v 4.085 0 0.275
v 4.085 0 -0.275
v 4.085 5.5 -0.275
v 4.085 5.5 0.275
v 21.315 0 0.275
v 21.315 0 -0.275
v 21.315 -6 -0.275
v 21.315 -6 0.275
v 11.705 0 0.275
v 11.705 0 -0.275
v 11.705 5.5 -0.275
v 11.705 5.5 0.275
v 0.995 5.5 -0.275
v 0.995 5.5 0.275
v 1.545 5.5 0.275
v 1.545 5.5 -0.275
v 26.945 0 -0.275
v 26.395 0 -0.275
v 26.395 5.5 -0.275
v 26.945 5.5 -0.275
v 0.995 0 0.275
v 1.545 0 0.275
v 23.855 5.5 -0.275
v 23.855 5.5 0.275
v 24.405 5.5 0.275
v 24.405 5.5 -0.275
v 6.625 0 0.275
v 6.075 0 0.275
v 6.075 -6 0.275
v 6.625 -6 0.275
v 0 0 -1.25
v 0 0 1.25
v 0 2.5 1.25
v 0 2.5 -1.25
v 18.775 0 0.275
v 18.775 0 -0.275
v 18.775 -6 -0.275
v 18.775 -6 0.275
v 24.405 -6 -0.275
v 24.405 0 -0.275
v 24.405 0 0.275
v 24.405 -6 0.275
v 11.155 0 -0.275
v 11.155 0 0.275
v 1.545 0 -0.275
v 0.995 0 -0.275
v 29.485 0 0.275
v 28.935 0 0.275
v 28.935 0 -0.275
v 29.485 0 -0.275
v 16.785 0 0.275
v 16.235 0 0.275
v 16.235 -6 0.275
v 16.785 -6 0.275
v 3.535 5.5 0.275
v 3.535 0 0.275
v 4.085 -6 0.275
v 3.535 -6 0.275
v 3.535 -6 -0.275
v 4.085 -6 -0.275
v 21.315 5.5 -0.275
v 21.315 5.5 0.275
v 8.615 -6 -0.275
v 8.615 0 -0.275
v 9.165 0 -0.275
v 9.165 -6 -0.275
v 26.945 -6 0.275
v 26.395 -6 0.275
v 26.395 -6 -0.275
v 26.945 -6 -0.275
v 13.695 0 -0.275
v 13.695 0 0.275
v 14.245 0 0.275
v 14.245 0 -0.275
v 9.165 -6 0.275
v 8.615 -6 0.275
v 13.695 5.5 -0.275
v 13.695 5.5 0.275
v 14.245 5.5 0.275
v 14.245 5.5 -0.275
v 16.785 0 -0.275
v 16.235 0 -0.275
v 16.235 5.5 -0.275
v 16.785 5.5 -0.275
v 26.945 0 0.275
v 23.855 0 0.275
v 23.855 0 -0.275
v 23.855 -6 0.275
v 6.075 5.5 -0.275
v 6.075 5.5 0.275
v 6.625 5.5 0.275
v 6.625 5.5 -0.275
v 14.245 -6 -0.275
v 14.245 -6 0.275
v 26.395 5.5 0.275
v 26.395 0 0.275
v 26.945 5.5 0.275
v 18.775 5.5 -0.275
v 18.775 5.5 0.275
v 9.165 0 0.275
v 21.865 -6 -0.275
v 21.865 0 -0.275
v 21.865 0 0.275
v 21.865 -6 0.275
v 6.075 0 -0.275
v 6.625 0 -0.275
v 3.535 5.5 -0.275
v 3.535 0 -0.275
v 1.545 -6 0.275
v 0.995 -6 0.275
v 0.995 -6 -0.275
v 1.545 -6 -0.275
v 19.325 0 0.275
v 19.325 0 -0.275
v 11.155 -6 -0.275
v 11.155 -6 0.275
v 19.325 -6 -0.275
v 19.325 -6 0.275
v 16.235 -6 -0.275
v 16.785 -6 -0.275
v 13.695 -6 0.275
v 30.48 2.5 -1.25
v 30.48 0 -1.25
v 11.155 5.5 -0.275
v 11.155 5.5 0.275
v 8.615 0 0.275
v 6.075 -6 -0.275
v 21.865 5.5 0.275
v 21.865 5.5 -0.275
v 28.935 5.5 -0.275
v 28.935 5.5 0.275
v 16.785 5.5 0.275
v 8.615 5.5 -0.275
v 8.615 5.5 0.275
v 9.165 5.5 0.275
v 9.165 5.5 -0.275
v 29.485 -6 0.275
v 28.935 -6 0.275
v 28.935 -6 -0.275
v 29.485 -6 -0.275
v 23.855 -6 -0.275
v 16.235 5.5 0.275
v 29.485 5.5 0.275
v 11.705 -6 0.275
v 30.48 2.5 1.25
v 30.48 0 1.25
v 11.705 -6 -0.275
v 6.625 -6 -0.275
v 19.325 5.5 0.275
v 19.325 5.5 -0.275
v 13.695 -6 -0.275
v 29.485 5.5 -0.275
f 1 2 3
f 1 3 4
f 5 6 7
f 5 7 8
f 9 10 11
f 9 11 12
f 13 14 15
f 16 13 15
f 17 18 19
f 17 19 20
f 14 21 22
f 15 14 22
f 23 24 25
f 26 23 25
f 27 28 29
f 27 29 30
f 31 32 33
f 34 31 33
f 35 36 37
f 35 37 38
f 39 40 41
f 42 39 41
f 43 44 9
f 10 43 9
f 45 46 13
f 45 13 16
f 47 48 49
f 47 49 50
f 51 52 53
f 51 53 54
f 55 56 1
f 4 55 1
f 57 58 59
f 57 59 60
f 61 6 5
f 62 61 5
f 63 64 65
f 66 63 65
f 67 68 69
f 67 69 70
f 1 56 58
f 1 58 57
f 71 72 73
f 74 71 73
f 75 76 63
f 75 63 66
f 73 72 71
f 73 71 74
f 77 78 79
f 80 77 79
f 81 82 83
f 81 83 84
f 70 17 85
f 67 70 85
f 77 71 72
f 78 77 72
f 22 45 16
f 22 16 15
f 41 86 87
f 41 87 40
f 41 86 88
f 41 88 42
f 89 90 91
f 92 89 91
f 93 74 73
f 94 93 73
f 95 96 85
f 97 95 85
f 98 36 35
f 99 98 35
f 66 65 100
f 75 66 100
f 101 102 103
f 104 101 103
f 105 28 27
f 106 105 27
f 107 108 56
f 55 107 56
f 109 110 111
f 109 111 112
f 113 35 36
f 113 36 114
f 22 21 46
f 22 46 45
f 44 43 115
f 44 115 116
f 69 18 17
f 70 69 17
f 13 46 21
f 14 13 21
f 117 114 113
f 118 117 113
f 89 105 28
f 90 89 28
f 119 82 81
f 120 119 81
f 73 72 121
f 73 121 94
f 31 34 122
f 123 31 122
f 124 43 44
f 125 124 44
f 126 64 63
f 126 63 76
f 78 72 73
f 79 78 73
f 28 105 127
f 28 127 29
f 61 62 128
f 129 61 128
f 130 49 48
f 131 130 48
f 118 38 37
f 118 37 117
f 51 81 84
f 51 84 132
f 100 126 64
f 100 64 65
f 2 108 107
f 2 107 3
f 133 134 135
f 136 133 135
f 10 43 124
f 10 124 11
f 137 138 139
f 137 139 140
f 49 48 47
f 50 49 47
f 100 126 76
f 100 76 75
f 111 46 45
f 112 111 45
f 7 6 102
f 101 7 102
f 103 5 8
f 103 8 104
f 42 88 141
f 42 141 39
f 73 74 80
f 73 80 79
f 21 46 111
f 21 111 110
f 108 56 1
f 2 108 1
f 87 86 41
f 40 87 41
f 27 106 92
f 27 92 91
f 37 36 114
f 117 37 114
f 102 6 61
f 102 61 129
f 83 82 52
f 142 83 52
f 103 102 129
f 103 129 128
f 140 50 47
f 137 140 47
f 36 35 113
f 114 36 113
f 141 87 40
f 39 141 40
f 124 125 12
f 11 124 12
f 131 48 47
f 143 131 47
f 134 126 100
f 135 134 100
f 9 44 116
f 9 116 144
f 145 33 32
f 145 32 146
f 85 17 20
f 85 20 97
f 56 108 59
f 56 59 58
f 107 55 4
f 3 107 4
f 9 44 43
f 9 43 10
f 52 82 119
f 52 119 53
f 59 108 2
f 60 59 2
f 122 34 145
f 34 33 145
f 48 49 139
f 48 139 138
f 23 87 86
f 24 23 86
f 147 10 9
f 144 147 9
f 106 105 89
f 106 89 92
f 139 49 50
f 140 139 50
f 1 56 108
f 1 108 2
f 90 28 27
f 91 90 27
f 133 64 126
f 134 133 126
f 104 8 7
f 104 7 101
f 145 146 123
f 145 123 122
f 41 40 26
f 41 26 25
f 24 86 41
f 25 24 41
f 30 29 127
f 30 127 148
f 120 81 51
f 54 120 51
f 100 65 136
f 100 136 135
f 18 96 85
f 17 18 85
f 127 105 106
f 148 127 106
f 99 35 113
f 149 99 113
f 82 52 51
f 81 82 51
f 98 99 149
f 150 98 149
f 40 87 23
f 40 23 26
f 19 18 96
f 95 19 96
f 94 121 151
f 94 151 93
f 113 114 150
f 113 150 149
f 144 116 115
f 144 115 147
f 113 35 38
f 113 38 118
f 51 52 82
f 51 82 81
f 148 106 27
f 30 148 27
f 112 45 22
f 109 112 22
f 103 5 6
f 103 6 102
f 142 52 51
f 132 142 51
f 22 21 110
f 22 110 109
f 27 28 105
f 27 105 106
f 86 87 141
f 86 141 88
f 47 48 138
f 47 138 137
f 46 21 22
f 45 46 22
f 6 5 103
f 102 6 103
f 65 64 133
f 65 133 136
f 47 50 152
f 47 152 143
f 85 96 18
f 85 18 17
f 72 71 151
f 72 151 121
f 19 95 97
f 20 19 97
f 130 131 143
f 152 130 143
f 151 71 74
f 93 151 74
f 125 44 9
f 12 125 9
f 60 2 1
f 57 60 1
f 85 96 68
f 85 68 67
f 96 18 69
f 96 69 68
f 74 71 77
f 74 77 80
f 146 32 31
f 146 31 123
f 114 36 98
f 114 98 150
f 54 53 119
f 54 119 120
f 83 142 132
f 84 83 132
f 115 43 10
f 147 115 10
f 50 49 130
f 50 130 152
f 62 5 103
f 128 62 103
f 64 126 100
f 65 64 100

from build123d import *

# Parameters (mm, degrees)
SKETCH1_W              = 30.48
SKETCH1_H              = 2.5
BOSS_EXTRUDE1_DEPTH    = 1.25
SKETCH2_W              = 0.55
SKETCH2_H              = 0.55
BOSS_EXTRUDE2_DEPTH    = 6
BOSS_EXTRUDE2_2_DEPTH  = 6
BOSS_EXTRUDE2_3_DEPTH  = 6
BOSS_EXTRUDE2_4_DEPTH  = 6
BOSS_EXTRUDE2_5_DEPTH  = 6
BOSS_EXTRUDE2_6_DEPTH  = 6
BOSS_EXTRUDE2_7_DEPTH  = 6
BOSS_EXTRUDE2_8_DEPTH  = 6
BOSS_EXTRUDE2_9_DEPTH  = 6
BOSS_EXTRUDE2_10_DEPTH = 6
BOSS_EXTRUDE2_11_DEPTH = 6
BOSS_EXTRUDE2_12_DEPTH = 6
SKETCH2_2_W            = 0.55
SKETCH2_2_H            = 0.55
BOSS_EXTRUDE3_DEPTH    = 5.5
BOSS_EXTRUDE3_2_DEPTH  = 5.5
BOSS_EXTRUDE3_3_DEPTH  = 5.5
BOSS_EXTRUDE3_4_DEPTH  = 5.5
BOSS_EXTRUDE3_5_DEPTH  = 5.5
BOSS_EXTRUDE3_6_DEPTH  = 5.5
BOSS_EXTRUDE3_7_DEPTH  = 5.5
BOSS_EXTRUDE3_8_DEPTH  = 5.5
BOSS_EXTRUDE3_9_DEPTH  = 5.5
BOSS_EXTRUDE3_10_DEPTH = 5.5
BOSS_EXTRUDE3_11_DEPTH = 5.5
BOSS_EXTRUDE3_12_DEPTH = 5.5


with BuildPart() as part:
    # Sketch1 → Boss-Extrude1 (new body, symmetric)
    with BuildSketch(Plane.XY):
        with Locations((15.24, 1.25)):
            Rectangle(SKETCH1_W, SKETCH1_H)
    extrude(amount=BOSS_EXTRUDE1_DEPTH, both=True)


with BuildPart() as body_2:
    # Sketch2 → Boss-Extrude2 (new body)
    with BuildSketch(Plane.XZ):
        with Locations((3.81, 0)):
            Rectangle(SKETCH2_W, SKETCH2_H)
    extrude(amount=BOSS_EXTRUDE2_DEPTH)


with BuildPart() as body_3:
    # Sketch2 → Boss-Extrude2 2 (new body)
    with BuildSketch(Plane.XZ):
        with Locations((1.27, 0)):
            Rectangle(SKETCH2_W, SKETCH2_H)
    extrude(amount=BOSS_EXTRUDE2_2_DEPTH)


with BuildPart() as body_4:
    # Sketch2 → Boss-Extrude2 3 (new body)
    with BuildSketch(Plane.XZ):
        with Locations((6.35, 0)):
            Rectangle(SKETCH2_W, SKETCH2_H)
    extrude(amount=BOSS_EXTRUDE2_3_DEPTH)


with BuildPart() as body_5:
    # Sketch2 → Boss-Extrude2 4 (new body)
    with BuildSketch(Plane.XZ):
        with Locations((8.89, 0)):
            Rectangle(SKETCH2_W, SKETCH2_H)
    extrude(amount=BOSS_EXTRUDE2_4_DEPTH)


with BuildPart() as body_6:
    # Sketch2 → Boss-Extrude2 5 (new body)
    with BuildSketch(Plane.XZ):
        with Locations((11.43, 0)):
            Rectangle(SKETCH2_W, SKETCH2_H)
    extrude(amount=BOSS_EXTRUDE2_5_DEPTH)


with BuildPart() as body_7:
    # Sketch2 → Boss-Extrude2 6 (new body)
    with BuildSketch(Plane.XZ):
        with Locations((13.97, 0)):
            Rectangle(SKETCH2_W, SKETCH2_H)
    extrude(amount=BOSS_EXTRUDE2_6_DEPTH)


with BuildPart() as body_8:
    # Sketch2 → Boss-Extrude2 7 (new body)
    with BuildSketch(Plane.XZ):
        with Locations((16.51, 0)):
            Rectangle(SKETCH2_W, SKETCH2_H)
    extrude(amount=BOSS_EXTRUDE2_7_DEPTH)


with BuildPart() as body_9:
    # Sketch2 → Boss-Extrude2 8 (new body)
    with BuildSketch(Plane.XZ):
        with Locations((19.05, 0)):
            Rectangle(SKETCH2_W, SKETCH2_H)
    extrude(amount=BOSS_EXTRUDE2_8_DEPTH)


with BuildPart() as body_10:
    # Sketch2 → Boss-Extrude2 9 (new body)
    with BuildSketch(Plane.XZ):
        with Locations((21.59, 0)):
            Rectangle(SKETCH2_W, SKETCH2_H)
    extrude(amount=BOSS_EXTRUDE2_9_DEPTH)


with BuildPart() as body_11:
    # Sketch2 → Boss-Extrude2 10 (new body)
    with BuildSketch(Plane.XZ):
        with Locations((24.13, 0)):
            Rectangle(SKETCH2_W, SKETCH2_H)
    extrude(amount=BOSS_EXTRUDE2_10_DEPTH)


with BuildPart() as body_12:
    # Sketch2 → Boss-Extrude2 11 (new body)
    with BuildSketch(Plane.XZ):
        with Locations((26.67, 0)):
            Rectangle(SKETCH2_W, SKETCH2_H)
    extrude(amount=BOSS_EXTRUDE2_11_DEPTH)


with BuildPart() as body_13:
    # Sketch2 → Boss-Extrude2 12 (new body)
    with BuildSketch(Plane.XZ):
        with Locations((29.21, 0)):
            Rectangle(SKETCH2_W, SKETCH2_H)
    extrude(amount=BOSS_EXTRUDE2_12_DEPTH)


with BuildPart() as body_14:
    # Sketch2_2 → Boss-Extrude3 (new body)
    with BuildSketch(Plane.XZ):
        with Locations((3.81, 0)):
            Rectangle(SKETCH2_2_W, SKETCH2_2_H)
    extrude(amount=-BOSS_EXTRUDE3_DEPTH)


with BuildPart() as body_15:
    # Sketch2_2 → Boss-Extrude3 2 (new body)
    with BuildSketch(Plane.XZ):
        with Locations((1.27, 0)):
            Rectangle(SKETCH2_2_W, SKETCH2_2_H)
    extrude(amount=-BOSS_EXTRUDE3_2_DEPTH)


with BuildPart() as body_16:
    # Sketch2_2 → Boss-Extrude3 3 (new body)
    with BuildSketch(Plane.XZ):
        with Locations((6.35, 0)):
            Rectangle(SKETCH2_2_W, SKETCH2_2_H)
    extrude(amount=-BOSS_EXTRUDE3_3_DEPTH)


with BuildPart() as body_17:
    # Sketch2_2 → Boss-Extrude3 4 (new body)
    with BuildSketch(Plane.XZ):
        with Locations((8.89, 0)):
            Rectangle(SKETCH2_2_W, SKETCH2_2_H)
    extrude(amount=-BOSS_EXTRUDE3_4_DEPTH)


with BuildPart() as body_18:
    # Sketch2_2 → Boss-Extrude3 5 (new body)
    with BuildSketch(Plane.XZ):
        with Locations((11.43, 0)):
            Rectangle(SKETCH2_2_W, SKETCH2_2_H)
    extrude(amount=-BOSS_EXTRUDE3_5_DEPTH)


with BuildPart() as body_19:
    # Sketch2_2 → Boss-Extrude3 6 (new body)
    with BuildSketch(Plane.XZ):
        with Locations((13.97, 0)):
            Rectangle(SKETCH2_2_W, SKETCH2_2_H)
    extrude(amount=-BOSS_EXTRUDE3_6_DEPTH)


with BuildPart() as body_20:
    # Sketch2_2 → Boss-Extrude3 7 (new body)
    with BuildSketch(Plane.XZ):
        with Locations((16.51, 0)):
            Rectangle(SKETCH2_2_W, SKETCH2_2_H)
    extrude(amount=-BOSS_EXTRUDE3_7_DEPTH)


with BuildPart() as body_21:
    # Sketch2_2 → Boss-Extrude3 8 (new body)
    with BuildSketch(Plane.XZ):
        with Locations((19.05, 0)):
            Rectangle(SKETCH2_2_W, SKETCH2_2_H)
    extrude(amount=-BOSS_EXTRUDE3_8_DEPTH)


with BuildPart() as body_22:
    # Sketch2_2 → Boss-Extrude3 9 (new body)
    with BuildSketch(Plane.XZ):
        with Locations((21.59, 0)):
            Rectangle(SKETCH2_2_W, SKETCH2_2_H)
    extrude(amount=-BOSS_EXTRUDE3_9_DEPTH)


with BuildPart() as body_23:
    # Sketch2_2 → Boss-Extrude3 10 (new body)
    with BuildSketch(Plane.XZ):
        with Locations((24.13, 0)):
            Rectangle(SKETCH2_2_W, SKETCH2_2_H)
    extrude(amount=-BOSS_EXTRUDE3_10_DEPTH)


with BuildPart() as body_24:
    # Sketch2_2 → Boss-Extrude3 11 (new body)
    with BuildSketch(Plane.XZ):
        with Locations((26.67, 0)):
            Rectangle(SKETCH2_2_W, SKETCH2_2_H)
    extrude(amount=-BOSS_EXTRUDE3_11_DEPTH)


with BuildPart() as body_25:
    # Sketch2_2 → Boss-Extrude3 12 (new body)
    with BuildSketch(Plane.XZ):
        with Locations((29.21, 0)):
            Rectangle(SKETCH2_2_W, SKETCH2_2_H)
    extrude(amount=-BOSS_EXTRUDE3_12_DEPTH)


solid = Compound([part.part, body_2.part, body_3.part, body_4.part, body_5.part, body_6.part, body_7.part, body_8.part, body_9.part, body_10.part, body_11.part, body_12.part, body_13.part, body_14.part, body_15.part, body_16.part, body_17.part, body_18.part, body_19.part, body_20.part, body_21.part, body_22.part, body_23.part, body_24.part, body_25.part])
